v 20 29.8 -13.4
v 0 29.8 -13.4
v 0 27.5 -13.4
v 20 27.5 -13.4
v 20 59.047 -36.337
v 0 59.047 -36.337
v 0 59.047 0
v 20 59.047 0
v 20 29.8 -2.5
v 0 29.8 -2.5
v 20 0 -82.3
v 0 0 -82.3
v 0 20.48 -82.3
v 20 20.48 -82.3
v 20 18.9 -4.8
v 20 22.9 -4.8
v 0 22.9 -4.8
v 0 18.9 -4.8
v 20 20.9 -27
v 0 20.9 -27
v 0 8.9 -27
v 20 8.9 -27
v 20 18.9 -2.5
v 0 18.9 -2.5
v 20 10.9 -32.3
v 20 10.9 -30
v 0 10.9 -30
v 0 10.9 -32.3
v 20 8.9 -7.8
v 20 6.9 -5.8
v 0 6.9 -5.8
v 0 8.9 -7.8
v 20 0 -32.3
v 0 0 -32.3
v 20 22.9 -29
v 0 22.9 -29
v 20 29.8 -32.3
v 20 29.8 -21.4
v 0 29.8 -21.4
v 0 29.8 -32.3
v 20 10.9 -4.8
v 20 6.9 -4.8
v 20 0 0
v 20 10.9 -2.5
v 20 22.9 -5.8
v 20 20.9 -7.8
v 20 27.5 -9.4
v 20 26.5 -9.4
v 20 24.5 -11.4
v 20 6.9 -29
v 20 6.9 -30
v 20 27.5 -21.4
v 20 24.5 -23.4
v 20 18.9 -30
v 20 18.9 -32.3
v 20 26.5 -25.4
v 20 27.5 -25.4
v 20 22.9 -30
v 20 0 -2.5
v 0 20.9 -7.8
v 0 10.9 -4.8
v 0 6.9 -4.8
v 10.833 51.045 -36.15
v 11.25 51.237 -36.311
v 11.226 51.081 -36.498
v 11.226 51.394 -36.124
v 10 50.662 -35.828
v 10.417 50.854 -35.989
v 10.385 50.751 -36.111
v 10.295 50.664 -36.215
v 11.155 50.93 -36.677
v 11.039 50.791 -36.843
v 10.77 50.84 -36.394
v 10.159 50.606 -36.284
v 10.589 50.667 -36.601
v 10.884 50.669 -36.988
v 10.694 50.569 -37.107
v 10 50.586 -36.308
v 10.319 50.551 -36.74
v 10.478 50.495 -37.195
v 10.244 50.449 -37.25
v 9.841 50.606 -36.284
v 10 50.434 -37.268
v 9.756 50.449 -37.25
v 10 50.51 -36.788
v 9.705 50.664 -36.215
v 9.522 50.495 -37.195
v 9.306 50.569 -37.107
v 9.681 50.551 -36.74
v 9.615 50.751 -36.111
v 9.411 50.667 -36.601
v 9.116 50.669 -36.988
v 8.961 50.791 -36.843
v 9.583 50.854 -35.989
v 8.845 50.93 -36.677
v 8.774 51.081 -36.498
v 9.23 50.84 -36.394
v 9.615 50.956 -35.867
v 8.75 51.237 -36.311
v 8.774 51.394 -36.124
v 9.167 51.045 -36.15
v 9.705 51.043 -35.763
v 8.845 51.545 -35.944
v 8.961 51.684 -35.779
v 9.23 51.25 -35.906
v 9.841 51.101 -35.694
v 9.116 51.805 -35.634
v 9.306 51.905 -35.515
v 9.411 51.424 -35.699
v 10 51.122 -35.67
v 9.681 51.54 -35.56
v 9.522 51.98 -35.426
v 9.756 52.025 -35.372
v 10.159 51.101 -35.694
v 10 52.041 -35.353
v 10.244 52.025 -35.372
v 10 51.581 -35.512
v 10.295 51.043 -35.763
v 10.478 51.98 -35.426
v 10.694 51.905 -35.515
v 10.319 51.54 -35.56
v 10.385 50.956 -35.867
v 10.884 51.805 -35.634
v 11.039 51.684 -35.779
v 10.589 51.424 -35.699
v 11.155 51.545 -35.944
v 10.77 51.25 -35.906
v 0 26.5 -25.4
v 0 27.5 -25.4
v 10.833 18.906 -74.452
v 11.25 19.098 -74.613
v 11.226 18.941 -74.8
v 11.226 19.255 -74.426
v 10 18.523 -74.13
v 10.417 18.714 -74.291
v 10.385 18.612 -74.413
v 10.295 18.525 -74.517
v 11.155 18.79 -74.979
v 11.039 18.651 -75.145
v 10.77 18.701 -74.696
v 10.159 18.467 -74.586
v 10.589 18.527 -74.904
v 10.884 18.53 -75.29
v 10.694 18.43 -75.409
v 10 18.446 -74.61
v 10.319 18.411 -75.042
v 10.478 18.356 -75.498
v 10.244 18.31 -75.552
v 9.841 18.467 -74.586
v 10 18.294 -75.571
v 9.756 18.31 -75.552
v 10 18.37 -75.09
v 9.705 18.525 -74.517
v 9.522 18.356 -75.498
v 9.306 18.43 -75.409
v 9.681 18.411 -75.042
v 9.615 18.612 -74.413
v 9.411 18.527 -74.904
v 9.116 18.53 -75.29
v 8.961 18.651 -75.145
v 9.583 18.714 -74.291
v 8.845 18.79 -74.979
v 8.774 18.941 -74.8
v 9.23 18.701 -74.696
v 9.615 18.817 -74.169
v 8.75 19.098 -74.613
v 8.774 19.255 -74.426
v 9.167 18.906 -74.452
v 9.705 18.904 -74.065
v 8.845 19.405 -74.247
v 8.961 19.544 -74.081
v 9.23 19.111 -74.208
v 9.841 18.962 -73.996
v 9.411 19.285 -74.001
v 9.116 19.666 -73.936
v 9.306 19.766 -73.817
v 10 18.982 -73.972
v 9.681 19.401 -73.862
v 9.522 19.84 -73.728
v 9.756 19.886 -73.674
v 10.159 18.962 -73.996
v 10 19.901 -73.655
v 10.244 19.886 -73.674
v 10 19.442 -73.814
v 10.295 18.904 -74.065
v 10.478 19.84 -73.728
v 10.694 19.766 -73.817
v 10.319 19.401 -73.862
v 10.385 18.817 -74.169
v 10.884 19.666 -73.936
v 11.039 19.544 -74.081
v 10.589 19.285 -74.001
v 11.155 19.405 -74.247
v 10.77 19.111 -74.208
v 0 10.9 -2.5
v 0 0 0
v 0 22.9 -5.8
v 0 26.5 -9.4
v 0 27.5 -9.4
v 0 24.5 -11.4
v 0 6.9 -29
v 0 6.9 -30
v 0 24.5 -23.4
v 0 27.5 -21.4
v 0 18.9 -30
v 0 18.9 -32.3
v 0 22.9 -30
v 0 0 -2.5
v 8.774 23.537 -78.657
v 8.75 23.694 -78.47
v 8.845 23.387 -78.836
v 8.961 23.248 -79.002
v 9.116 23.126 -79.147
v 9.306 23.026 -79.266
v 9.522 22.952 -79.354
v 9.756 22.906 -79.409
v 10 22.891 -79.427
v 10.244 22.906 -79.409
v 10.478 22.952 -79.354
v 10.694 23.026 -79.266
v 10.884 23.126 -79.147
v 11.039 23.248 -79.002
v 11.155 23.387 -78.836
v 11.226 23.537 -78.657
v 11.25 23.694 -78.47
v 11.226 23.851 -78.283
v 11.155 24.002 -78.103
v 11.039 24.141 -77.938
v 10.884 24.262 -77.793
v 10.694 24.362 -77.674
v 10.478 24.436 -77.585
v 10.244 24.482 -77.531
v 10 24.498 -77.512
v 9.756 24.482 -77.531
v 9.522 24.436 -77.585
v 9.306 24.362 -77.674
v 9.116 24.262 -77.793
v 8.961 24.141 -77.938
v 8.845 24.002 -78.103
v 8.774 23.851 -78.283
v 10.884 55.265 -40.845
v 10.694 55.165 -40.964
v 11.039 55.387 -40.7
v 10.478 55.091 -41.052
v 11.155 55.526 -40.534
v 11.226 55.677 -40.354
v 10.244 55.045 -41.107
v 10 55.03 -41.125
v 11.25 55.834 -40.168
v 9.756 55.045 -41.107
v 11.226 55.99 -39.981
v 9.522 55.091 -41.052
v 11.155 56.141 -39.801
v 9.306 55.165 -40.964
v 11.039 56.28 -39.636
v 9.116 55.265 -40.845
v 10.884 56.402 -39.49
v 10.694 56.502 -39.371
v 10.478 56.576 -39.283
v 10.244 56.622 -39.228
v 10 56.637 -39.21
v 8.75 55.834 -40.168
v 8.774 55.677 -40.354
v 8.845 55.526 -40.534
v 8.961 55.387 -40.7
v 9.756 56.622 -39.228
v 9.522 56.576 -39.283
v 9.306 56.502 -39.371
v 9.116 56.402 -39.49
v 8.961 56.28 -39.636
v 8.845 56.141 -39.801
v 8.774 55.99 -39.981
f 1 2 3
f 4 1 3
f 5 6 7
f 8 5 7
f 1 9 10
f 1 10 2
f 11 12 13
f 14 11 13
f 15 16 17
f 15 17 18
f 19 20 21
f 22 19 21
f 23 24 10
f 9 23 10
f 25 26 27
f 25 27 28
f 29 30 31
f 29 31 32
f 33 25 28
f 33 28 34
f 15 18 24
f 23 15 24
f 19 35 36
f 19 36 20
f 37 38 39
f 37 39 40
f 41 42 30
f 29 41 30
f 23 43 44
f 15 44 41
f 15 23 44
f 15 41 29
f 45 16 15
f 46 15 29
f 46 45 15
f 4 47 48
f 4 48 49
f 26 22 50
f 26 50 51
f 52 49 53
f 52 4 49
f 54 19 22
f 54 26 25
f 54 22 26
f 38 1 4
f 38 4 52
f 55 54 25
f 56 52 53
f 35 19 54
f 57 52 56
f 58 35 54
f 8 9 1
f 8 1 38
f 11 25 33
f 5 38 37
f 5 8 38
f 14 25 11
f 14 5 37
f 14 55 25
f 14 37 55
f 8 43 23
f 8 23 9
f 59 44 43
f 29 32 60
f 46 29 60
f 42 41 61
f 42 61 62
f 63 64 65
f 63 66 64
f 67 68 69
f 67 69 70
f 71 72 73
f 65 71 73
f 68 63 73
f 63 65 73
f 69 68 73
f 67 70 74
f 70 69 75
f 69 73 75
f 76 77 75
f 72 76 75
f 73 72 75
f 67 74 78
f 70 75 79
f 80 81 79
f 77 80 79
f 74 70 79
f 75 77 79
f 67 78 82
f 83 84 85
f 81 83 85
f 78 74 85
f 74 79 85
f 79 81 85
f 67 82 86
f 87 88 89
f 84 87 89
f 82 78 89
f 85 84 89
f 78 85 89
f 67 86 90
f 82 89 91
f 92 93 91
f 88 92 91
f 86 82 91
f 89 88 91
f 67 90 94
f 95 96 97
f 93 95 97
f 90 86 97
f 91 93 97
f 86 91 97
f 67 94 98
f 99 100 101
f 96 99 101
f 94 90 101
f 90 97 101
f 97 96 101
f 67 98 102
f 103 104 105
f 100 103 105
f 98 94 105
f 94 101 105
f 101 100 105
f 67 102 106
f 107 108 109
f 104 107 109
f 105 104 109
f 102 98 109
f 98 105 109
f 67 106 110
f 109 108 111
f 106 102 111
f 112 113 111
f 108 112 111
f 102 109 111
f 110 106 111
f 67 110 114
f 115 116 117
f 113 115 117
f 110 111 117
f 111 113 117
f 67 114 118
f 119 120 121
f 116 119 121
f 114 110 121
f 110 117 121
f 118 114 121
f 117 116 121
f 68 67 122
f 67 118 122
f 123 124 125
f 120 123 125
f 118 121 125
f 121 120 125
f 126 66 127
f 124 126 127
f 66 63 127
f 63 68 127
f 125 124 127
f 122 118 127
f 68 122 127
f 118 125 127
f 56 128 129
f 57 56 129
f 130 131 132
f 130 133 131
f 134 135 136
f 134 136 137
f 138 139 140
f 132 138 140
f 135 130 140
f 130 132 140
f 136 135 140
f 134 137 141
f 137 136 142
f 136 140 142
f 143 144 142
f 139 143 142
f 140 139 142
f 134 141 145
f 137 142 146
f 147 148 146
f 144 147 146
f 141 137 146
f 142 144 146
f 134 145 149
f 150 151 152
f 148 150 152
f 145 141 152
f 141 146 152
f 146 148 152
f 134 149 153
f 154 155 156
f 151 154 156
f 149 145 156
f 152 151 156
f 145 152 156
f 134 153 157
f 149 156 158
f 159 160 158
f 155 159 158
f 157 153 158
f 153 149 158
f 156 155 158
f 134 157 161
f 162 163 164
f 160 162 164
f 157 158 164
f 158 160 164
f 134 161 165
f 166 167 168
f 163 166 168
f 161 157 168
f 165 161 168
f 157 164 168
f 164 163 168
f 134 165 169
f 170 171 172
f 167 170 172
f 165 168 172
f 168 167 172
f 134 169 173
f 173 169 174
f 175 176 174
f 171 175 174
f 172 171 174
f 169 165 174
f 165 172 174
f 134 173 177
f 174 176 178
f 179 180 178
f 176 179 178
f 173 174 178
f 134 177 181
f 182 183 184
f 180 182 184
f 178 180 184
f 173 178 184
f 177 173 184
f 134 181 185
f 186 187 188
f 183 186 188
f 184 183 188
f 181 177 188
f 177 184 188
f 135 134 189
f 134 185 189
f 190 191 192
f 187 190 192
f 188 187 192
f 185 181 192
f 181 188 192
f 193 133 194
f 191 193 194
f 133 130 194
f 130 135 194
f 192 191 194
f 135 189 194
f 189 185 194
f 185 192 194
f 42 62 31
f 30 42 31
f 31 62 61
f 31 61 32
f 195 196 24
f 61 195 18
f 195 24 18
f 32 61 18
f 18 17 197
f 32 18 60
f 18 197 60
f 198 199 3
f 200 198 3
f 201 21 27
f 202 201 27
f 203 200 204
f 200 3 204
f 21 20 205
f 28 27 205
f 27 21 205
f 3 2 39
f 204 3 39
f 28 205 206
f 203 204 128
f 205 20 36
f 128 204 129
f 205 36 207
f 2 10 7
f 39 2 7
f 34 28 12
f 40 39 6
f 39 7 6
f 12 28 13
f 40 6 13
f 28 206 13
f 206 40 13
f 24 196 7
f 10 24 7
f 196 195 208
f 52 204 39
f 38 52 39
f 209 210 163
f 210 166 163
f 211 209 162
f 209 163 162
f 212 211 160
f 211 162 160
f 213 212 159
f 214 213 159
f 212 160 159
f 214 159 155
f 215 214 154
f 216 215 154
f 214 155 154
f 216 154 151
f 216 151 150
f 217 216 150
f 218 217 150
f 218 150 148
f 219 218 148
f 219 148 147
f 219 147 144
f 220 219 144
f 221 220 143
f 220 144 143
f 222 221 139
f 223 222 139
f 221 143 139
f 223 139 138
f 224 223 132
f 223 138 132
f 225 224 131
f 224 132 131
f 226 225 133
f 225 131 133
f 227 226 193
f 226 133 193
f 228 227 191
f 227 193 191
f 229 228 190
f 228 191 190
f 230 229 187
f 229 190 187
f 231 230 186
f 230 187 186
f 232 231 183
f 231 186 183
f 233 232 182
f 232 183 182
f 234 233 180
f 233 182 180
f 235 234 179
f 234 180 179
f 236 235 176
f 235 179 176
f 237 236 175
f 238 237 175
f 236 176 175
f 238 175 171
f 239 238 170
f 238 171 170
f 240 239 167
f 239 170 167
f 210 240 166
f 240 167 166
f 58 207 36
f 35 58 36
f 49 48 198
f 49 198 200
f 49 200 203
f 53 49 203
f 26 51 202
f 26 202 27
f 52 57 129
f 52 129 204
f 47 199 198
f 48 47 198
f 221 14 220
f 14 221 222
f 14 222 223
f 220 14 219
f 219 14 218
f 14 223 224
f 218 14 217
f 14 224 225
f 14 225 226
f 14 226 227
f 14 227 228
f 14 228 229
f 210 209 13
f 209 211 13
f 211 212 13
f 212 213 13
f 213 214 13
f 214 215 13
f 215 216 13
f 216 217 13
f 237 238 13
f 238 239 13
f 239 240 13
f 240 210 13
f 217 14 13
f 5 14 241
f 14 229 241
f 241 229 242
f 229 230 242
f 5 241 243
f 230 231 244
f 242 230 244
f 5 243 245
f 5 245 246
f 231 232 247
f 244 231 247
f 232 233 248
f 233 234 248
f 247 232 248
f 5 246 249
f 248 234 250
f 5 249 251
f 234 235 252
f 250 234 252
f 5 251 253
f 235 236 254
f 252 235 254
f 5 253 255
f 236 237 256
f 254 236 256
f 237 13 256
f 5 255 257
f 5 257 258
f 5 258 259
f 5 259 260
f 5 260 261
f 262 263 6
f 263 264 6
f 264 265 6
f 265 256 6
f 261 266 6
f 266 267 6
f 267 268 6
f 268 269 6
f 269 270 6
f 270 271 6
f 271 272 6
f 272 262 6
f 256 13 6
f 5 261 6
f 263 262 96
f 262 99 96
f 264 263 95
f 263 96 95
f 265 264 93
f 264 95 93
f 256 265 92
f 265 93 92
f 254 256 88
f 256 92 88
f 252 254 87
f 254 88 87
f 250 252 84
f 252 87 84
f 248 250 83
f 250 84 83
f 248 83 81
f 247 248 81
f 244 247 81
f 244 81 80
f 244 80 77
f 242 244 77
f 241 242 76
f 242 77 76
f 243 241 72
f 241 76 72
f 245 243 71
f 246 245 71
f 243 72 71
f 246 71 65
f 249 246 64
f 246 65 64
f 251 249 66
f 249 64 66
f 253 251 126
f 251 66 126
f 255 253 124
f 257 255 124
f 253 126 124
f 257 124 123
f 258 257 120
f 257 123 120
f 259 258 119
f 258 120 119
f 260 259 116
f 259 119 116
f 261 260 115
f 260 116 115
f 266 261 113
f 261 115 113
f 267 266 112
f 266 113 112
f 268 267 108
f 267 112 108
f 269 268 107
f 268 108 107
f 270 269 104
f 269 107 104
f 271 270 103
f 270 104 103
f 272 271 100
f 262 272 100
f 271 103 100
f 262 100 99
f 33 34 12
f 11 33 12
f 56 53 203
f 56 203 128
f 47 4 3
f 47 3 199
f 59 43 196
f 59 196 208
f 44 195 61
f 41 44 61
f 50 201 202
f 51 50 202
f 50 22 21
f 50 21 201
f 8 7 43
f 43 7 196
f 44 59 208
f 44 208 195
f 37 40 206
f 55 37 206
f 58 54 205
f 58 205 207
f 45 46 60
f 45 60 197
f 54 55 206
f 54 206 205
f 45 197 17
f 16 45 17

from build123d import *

# Parameters (mm, degrees)
BOSS_EXTRU_1_DEPTH                            = 20
TROU_POUR_TARAUDAGE_POUR_TROU_TARAUD_M3_D     = 2.5
TROU_POUR_TARAUDAGE_POUR_TROU_TARAUD_M3_DEPTH = 6
TROU_POUR_TARAUDAGE_POUR_TROU_TARAUD_M3_TIP   = 0.751075774


with BuildPart() as part:
    # Esquisse1 → Boss.-Extru.1 (new body)
    with BuildSketch(Plane(origin=(0, 0, 0), x_dir=(0, 0, -1), z_dir=(1, 0, 0))):
        Polygon((4.8, 18.9), (2.5, 18.9), (2.5, 29.8), (13.4, 29.8), (13.4, 27.5), (9.4, 27.5), (9.4, 26.5), (11.4, 24.5), (23.4, 24.5), (25.4, 26.5), (25.4, 27.5), (21.4, 27.5), (21.4, 29.8), (32.3, 29.8), (32.3, 18.9), (30, 18.9), (30, 22.9), (29, 22.9), (27, 20.9), (27, 8.9), (29, 6.9), (30, 6.9), (30, 10.9), (32.3, 10.9), (32.3, 0), (82.3, 0), (82.3, 20.480200674), (36.337333413, 59.047457256), (0, 59.047457256), (0, 0), (2.5, 0), (2.5, 10.9), (4.8, 10.9), (4.8, 6.9), (5.8, 6.9), (7.8, 8.9), (7.8, 20.9), (5.8, 22.9), (4.8, 22.9), align=None)
    extrude(amount=BOSS_EXTRU_1_DEPTH)

    # Trou pour taraudage pour trou taraudé M3x0.51
    with Locations(Plane(origin=(0, 52.543114136, -44.088907693), x_dir=(1, 0, 0), z_dir=(0, 0.7660444431189818, -0.6427876096865348))):
        with Locations((10, -5.118961569), (10, 44.881038431)):
            Hole(TROU_POUR_TARAUDAGE_POUR_TROU_TARAUD_M3_D / 2, depth=TROU_POUR_TARAUDAGE_POUR_TROU_TARAUD_M3_DEPTH)
            with Locations((0, 0, -(TROU_POUR_TARAUDAGE_POUR_TROU_TARAUD_M3_DEPTH + TROU_POUR_TARAUDAGE_POUR_TROU_TARAUD_M3_TIP / 2))):  # 118° drill point
                Cone(0, TROU_POUR_TARAUDAGE_POUR_TROU_TARAUD_M3_D / 2, TROU_POUR_TARAUDAGE_POUR_TROU_TARAUD_M3_TIP, mode=Mode.SUBTRACT)


solid = part.part
